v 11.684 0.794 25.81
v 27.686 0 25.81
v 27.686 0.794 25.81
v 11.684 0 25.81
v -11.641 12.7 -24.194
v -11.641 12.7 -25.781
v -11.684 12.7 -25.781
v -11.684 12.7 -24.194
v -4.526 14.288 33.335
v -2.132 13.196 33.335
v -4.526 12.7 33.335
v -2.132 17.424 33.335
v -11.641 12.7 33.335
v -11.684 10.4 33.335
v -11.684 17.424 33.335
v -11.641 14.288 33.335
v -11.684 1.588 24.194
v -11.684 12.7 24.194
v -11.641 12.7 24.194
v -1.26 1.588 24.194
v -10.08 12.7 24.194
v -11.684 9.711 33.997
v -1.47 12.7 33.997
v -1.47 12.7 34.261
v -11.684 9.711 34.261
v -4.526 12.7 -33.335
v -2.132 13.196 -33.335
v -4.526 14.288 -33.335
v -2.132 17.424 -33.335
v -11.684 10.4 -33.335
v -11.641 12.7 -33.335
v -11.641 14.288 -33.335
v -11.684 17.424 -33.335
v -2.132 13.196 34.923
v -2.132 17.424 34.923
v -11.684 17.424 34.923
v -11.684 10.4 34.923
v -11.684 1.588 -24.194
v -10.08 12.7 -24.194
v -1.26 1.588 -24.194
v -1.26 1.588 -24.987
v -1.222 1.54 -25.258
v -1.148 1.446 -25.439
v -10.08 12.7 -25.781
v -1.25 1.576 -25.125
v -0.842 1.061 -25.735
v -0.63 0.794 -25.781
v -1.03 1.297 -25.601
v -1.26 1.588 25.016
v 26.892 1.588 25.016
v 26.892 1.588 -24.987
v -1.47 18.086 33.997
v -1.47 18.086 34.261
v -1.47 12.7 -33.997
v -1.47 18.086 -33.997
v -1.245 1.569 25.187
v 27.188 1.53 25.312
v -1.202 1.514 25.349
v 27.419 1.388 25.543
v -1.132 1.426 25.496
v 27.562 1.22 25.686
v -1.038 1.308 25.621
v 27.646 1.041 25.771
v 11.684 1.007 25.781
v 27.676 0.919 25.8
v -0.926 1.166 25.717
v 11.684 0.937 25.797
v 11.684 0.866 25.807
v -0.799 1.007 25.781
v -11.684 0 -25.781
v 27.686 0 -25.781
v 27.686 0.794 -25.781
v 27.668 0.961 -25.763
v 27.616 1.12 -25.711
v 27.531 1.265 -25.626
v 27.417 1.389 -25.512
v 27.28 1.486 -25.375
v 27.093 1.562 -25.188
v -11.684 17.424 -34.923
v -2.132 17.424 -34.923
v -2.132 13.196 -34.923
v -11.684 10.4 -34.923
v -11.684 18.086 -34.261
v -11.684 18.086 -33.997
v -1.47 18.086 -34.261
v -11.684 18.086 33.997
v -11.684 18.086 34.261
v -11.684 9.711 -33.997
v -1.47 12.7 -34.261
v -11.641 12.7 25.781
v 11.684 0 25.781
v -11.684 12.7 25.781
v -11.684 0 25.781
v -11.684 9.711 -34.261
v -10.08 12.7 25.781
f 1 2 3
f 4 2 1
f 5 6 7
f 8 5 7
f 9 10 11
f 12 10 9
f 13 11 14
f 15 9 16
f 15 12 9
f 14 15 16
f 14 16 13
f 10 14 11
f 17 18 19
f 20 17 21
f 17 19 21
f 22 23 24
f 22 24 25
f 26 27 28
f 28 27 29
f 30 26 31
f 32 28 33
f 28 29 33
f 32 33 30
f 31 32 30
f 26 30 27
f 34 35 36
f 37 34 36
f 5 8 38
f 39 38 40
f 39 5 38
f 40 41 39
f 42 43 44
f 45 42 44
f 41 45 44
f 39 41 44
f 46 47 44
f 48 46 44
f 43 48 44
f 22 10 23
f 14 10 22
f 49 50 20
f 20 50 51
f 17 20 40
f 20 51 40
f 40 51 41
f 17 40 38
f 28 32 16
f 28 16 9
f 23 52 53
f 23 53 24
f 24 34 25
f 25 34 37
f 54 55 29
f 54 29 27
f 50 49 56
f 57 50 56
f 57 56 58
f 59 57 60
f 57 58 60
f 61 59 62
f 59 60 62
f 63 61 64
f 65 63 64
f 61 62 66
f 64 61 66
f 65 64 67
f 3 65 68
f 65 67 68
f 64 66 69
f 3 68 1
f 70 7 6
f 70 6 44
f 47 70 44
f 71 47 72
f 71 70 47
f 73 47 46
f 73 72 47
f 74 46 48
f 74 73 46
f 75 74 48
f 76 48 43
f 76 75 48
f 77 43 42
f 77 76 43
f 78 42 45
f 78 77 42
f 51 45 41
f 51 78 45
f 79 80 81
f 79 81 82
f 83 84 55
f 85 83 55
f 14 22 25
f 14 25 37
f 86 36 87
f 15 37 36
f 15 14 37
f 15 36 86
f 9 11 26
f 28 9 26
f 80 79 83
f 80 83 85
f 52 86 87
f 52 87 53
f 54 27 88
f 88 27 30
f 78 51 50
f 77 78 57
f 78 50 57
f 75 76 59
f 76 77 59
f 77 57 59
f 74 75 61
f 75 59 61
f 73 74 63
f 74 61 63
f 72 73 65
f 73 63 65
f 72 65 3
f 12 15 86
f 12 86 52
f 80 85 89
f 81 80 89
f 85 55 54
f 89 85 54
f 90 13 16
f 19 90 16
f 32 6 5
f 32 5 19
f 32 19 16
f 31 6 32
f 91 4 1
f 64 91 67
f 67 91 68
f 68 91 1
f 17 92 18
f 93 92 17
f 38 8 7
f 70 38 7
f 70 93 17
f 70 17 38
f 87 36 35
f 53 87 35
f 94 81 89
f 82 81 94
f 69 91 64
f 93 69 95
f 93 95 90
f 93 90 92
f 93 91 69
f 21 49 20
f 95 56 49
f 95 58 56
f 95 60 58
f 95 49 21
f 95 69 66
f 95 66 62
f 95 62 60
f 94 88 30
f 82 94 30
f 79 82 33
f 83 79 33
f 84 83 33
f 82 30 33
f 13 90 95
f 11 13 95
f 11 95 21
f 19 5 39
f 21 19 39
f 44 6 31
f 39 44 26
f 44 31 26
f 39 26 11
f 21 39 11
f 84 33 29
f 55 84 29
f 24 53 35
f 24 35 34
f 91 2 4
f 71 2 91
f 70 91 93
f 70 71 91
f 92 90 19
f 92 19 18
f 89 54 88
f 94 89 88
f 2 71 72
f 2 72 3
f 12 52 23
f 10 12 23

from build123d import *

# Parameters (mm, degrees)
BOSS_EXTRUDE1_DEPTH = 1.5875
BOSS_EXTRUDE3_DEPTH = 1.5875
SKETCH9_W           = 7.115403393296309
SKETCH9_H           = 66.67028171012657
BOSS_EXTRUDE4_DEPTH = 1.5875
BOSS_EXTRUDE5_DEPTH = 1.5875
CHAMFER1_SIZE       = 0.6614583333333334
CHAMFER2_SIZE       = 0.6614583333333334
BOSS_EXTRUDE6_DEPTH = 1.5875
FILLET5_R           = 0.79375


with BuildPart() as part:
    # 3DSketch3 → Boss-Extrude1 (new body)
    with BuildSketch(Plane(origin=(11.684, 0, 25.781), x_dir=(-0.41278854058734626, 0, -0.910826888469905), z_dir=(0, 1, 0))):
        Polygon((0, 0), (9.646042616445111, 21.284202729764747), (56.61009863973035, 0), (46.96405602328524, -21.284202729764747), align=None)
    extrude(amount=BOSS_EXTRUDE1_DEPTH)

    # Sketch1 → Boss-Extrude3 (add)
    with BuildSketch(Plane.XY.offset(25.781)):
        Polygon((-3.47e-15, 0), (-10.08001412814663, 12.7), (-11.684000000000005, 12.7), (-11.684000000000005, 0), align=None)
    boss_extrude3 = extrude(amount=-BOSS_EXTRUDE3_DEPTH)

    # Mirror2: Boss-Extrude3 across plane
    add(boss_extrude3.mirror(Plane.XY))

    # Sketch9 → Boss-Extrude4 (add)
    with BuildSketch(Plane(origin=(0, 12.7, 0), x_dir=(1, 0, 0), z_dir=(0, 1, 0))):
        with Locations((-8.083759928300761, 0)):
            Rectangle(SKETCH9_W, SKETCH9_H)
    extrude(amount=BOSS_EXTRUDE4_DEPTH)

    # Sketch10 → Boss-Extrude5 (add)
    with BuildSketch(Plane.XY.offset(33.33514085506329)):
        Polygon((-11.684000000000005, 9.710531383967755), (-11.684000000000005, 18.08556377199017), (-1.4701183607090107, 18.08556377199017), (-1.4701183607090107, 12.7), align=None)
    boss_extrude5 = extrude(amount=BOSS_EXTRUDE5_DEPTH)

    # Chamfer1
    chamfer1_edges = [part.edges().sort_by_distance(p)[0] for p in [
        (-1.4701183607090107, 15.392781885995085, 33.33514085506329),
        (-6.5770591803545075, 11.205265691983877, 33.33514085506329),
        (-6.5770591803545075, 18.08556377199017, 33.33514085506329),
        (-1.4701183607090107, 15.392781885995085, 34.922640855063285),
        (-6.5770591803545075, 18.08556377199017, 34.922640855063285),
        (-6.5770591803545075, 11.205265691983877, 34.922640855063285),
    ]]
    chamfer(chamfer1_edges, length=CHAMFER1_SIZE)

    # Mirror4: Boss-Extrude5 across plane
    add(boss_extrude5.mirror(Plane.XY))

    # Chamfer2
    chamfer2_edges = [part.edges().sort_by_distance(p)[0] for p in [
        (-1.4701183607090107, 15.392781885995085, -33.33514085506329),
        (-6.5770591803545075, 11.205265691983877, -33.33514085506329),
        (-6.5770591803545075, 18.08556377199017, -33.33514085506329),
        (-1.4701183607090107, 15.392781885995085, -34.922640855063285),
        (-6.5770591803545075, 11.205265691983877, -34.922640855063285),
        (-6.5770591803545075, 18.08556377199017, -34.922640855063285),
    ]]
    chamfer(chamfer2_edges, length=CHAMFER2_SIZE)

    # Sketch12 → Boss-Extrude6 (add)
    with BuildSketch(Plane(origin=(0, 0, 0), x_dir=(1, 0, 0), z_dir=(0, 1, 0))):
        Polygon((11.684, 25.781), (27.685999999999996, 25.781), (27.686000000000003, -25.810245145350073), (11.684, -25.810245145350073), align=None)
    extrude(amount=BOSS_EXTRUDE6_DEPTH)

    # Fillet5
    fillet5_edges = [part.edges().sort_by_distance(p)[0] for p in [
        (19.685000000000002, 1.5875, 25.810245145350073),
        (13.212999116990831, 1.5875, -25.781),
        (27.686, 1.5875, 0.0146225726750373),
    ]]
    fillet(fillet5_edges, radius=FILLET5_R)


solid = part.part
